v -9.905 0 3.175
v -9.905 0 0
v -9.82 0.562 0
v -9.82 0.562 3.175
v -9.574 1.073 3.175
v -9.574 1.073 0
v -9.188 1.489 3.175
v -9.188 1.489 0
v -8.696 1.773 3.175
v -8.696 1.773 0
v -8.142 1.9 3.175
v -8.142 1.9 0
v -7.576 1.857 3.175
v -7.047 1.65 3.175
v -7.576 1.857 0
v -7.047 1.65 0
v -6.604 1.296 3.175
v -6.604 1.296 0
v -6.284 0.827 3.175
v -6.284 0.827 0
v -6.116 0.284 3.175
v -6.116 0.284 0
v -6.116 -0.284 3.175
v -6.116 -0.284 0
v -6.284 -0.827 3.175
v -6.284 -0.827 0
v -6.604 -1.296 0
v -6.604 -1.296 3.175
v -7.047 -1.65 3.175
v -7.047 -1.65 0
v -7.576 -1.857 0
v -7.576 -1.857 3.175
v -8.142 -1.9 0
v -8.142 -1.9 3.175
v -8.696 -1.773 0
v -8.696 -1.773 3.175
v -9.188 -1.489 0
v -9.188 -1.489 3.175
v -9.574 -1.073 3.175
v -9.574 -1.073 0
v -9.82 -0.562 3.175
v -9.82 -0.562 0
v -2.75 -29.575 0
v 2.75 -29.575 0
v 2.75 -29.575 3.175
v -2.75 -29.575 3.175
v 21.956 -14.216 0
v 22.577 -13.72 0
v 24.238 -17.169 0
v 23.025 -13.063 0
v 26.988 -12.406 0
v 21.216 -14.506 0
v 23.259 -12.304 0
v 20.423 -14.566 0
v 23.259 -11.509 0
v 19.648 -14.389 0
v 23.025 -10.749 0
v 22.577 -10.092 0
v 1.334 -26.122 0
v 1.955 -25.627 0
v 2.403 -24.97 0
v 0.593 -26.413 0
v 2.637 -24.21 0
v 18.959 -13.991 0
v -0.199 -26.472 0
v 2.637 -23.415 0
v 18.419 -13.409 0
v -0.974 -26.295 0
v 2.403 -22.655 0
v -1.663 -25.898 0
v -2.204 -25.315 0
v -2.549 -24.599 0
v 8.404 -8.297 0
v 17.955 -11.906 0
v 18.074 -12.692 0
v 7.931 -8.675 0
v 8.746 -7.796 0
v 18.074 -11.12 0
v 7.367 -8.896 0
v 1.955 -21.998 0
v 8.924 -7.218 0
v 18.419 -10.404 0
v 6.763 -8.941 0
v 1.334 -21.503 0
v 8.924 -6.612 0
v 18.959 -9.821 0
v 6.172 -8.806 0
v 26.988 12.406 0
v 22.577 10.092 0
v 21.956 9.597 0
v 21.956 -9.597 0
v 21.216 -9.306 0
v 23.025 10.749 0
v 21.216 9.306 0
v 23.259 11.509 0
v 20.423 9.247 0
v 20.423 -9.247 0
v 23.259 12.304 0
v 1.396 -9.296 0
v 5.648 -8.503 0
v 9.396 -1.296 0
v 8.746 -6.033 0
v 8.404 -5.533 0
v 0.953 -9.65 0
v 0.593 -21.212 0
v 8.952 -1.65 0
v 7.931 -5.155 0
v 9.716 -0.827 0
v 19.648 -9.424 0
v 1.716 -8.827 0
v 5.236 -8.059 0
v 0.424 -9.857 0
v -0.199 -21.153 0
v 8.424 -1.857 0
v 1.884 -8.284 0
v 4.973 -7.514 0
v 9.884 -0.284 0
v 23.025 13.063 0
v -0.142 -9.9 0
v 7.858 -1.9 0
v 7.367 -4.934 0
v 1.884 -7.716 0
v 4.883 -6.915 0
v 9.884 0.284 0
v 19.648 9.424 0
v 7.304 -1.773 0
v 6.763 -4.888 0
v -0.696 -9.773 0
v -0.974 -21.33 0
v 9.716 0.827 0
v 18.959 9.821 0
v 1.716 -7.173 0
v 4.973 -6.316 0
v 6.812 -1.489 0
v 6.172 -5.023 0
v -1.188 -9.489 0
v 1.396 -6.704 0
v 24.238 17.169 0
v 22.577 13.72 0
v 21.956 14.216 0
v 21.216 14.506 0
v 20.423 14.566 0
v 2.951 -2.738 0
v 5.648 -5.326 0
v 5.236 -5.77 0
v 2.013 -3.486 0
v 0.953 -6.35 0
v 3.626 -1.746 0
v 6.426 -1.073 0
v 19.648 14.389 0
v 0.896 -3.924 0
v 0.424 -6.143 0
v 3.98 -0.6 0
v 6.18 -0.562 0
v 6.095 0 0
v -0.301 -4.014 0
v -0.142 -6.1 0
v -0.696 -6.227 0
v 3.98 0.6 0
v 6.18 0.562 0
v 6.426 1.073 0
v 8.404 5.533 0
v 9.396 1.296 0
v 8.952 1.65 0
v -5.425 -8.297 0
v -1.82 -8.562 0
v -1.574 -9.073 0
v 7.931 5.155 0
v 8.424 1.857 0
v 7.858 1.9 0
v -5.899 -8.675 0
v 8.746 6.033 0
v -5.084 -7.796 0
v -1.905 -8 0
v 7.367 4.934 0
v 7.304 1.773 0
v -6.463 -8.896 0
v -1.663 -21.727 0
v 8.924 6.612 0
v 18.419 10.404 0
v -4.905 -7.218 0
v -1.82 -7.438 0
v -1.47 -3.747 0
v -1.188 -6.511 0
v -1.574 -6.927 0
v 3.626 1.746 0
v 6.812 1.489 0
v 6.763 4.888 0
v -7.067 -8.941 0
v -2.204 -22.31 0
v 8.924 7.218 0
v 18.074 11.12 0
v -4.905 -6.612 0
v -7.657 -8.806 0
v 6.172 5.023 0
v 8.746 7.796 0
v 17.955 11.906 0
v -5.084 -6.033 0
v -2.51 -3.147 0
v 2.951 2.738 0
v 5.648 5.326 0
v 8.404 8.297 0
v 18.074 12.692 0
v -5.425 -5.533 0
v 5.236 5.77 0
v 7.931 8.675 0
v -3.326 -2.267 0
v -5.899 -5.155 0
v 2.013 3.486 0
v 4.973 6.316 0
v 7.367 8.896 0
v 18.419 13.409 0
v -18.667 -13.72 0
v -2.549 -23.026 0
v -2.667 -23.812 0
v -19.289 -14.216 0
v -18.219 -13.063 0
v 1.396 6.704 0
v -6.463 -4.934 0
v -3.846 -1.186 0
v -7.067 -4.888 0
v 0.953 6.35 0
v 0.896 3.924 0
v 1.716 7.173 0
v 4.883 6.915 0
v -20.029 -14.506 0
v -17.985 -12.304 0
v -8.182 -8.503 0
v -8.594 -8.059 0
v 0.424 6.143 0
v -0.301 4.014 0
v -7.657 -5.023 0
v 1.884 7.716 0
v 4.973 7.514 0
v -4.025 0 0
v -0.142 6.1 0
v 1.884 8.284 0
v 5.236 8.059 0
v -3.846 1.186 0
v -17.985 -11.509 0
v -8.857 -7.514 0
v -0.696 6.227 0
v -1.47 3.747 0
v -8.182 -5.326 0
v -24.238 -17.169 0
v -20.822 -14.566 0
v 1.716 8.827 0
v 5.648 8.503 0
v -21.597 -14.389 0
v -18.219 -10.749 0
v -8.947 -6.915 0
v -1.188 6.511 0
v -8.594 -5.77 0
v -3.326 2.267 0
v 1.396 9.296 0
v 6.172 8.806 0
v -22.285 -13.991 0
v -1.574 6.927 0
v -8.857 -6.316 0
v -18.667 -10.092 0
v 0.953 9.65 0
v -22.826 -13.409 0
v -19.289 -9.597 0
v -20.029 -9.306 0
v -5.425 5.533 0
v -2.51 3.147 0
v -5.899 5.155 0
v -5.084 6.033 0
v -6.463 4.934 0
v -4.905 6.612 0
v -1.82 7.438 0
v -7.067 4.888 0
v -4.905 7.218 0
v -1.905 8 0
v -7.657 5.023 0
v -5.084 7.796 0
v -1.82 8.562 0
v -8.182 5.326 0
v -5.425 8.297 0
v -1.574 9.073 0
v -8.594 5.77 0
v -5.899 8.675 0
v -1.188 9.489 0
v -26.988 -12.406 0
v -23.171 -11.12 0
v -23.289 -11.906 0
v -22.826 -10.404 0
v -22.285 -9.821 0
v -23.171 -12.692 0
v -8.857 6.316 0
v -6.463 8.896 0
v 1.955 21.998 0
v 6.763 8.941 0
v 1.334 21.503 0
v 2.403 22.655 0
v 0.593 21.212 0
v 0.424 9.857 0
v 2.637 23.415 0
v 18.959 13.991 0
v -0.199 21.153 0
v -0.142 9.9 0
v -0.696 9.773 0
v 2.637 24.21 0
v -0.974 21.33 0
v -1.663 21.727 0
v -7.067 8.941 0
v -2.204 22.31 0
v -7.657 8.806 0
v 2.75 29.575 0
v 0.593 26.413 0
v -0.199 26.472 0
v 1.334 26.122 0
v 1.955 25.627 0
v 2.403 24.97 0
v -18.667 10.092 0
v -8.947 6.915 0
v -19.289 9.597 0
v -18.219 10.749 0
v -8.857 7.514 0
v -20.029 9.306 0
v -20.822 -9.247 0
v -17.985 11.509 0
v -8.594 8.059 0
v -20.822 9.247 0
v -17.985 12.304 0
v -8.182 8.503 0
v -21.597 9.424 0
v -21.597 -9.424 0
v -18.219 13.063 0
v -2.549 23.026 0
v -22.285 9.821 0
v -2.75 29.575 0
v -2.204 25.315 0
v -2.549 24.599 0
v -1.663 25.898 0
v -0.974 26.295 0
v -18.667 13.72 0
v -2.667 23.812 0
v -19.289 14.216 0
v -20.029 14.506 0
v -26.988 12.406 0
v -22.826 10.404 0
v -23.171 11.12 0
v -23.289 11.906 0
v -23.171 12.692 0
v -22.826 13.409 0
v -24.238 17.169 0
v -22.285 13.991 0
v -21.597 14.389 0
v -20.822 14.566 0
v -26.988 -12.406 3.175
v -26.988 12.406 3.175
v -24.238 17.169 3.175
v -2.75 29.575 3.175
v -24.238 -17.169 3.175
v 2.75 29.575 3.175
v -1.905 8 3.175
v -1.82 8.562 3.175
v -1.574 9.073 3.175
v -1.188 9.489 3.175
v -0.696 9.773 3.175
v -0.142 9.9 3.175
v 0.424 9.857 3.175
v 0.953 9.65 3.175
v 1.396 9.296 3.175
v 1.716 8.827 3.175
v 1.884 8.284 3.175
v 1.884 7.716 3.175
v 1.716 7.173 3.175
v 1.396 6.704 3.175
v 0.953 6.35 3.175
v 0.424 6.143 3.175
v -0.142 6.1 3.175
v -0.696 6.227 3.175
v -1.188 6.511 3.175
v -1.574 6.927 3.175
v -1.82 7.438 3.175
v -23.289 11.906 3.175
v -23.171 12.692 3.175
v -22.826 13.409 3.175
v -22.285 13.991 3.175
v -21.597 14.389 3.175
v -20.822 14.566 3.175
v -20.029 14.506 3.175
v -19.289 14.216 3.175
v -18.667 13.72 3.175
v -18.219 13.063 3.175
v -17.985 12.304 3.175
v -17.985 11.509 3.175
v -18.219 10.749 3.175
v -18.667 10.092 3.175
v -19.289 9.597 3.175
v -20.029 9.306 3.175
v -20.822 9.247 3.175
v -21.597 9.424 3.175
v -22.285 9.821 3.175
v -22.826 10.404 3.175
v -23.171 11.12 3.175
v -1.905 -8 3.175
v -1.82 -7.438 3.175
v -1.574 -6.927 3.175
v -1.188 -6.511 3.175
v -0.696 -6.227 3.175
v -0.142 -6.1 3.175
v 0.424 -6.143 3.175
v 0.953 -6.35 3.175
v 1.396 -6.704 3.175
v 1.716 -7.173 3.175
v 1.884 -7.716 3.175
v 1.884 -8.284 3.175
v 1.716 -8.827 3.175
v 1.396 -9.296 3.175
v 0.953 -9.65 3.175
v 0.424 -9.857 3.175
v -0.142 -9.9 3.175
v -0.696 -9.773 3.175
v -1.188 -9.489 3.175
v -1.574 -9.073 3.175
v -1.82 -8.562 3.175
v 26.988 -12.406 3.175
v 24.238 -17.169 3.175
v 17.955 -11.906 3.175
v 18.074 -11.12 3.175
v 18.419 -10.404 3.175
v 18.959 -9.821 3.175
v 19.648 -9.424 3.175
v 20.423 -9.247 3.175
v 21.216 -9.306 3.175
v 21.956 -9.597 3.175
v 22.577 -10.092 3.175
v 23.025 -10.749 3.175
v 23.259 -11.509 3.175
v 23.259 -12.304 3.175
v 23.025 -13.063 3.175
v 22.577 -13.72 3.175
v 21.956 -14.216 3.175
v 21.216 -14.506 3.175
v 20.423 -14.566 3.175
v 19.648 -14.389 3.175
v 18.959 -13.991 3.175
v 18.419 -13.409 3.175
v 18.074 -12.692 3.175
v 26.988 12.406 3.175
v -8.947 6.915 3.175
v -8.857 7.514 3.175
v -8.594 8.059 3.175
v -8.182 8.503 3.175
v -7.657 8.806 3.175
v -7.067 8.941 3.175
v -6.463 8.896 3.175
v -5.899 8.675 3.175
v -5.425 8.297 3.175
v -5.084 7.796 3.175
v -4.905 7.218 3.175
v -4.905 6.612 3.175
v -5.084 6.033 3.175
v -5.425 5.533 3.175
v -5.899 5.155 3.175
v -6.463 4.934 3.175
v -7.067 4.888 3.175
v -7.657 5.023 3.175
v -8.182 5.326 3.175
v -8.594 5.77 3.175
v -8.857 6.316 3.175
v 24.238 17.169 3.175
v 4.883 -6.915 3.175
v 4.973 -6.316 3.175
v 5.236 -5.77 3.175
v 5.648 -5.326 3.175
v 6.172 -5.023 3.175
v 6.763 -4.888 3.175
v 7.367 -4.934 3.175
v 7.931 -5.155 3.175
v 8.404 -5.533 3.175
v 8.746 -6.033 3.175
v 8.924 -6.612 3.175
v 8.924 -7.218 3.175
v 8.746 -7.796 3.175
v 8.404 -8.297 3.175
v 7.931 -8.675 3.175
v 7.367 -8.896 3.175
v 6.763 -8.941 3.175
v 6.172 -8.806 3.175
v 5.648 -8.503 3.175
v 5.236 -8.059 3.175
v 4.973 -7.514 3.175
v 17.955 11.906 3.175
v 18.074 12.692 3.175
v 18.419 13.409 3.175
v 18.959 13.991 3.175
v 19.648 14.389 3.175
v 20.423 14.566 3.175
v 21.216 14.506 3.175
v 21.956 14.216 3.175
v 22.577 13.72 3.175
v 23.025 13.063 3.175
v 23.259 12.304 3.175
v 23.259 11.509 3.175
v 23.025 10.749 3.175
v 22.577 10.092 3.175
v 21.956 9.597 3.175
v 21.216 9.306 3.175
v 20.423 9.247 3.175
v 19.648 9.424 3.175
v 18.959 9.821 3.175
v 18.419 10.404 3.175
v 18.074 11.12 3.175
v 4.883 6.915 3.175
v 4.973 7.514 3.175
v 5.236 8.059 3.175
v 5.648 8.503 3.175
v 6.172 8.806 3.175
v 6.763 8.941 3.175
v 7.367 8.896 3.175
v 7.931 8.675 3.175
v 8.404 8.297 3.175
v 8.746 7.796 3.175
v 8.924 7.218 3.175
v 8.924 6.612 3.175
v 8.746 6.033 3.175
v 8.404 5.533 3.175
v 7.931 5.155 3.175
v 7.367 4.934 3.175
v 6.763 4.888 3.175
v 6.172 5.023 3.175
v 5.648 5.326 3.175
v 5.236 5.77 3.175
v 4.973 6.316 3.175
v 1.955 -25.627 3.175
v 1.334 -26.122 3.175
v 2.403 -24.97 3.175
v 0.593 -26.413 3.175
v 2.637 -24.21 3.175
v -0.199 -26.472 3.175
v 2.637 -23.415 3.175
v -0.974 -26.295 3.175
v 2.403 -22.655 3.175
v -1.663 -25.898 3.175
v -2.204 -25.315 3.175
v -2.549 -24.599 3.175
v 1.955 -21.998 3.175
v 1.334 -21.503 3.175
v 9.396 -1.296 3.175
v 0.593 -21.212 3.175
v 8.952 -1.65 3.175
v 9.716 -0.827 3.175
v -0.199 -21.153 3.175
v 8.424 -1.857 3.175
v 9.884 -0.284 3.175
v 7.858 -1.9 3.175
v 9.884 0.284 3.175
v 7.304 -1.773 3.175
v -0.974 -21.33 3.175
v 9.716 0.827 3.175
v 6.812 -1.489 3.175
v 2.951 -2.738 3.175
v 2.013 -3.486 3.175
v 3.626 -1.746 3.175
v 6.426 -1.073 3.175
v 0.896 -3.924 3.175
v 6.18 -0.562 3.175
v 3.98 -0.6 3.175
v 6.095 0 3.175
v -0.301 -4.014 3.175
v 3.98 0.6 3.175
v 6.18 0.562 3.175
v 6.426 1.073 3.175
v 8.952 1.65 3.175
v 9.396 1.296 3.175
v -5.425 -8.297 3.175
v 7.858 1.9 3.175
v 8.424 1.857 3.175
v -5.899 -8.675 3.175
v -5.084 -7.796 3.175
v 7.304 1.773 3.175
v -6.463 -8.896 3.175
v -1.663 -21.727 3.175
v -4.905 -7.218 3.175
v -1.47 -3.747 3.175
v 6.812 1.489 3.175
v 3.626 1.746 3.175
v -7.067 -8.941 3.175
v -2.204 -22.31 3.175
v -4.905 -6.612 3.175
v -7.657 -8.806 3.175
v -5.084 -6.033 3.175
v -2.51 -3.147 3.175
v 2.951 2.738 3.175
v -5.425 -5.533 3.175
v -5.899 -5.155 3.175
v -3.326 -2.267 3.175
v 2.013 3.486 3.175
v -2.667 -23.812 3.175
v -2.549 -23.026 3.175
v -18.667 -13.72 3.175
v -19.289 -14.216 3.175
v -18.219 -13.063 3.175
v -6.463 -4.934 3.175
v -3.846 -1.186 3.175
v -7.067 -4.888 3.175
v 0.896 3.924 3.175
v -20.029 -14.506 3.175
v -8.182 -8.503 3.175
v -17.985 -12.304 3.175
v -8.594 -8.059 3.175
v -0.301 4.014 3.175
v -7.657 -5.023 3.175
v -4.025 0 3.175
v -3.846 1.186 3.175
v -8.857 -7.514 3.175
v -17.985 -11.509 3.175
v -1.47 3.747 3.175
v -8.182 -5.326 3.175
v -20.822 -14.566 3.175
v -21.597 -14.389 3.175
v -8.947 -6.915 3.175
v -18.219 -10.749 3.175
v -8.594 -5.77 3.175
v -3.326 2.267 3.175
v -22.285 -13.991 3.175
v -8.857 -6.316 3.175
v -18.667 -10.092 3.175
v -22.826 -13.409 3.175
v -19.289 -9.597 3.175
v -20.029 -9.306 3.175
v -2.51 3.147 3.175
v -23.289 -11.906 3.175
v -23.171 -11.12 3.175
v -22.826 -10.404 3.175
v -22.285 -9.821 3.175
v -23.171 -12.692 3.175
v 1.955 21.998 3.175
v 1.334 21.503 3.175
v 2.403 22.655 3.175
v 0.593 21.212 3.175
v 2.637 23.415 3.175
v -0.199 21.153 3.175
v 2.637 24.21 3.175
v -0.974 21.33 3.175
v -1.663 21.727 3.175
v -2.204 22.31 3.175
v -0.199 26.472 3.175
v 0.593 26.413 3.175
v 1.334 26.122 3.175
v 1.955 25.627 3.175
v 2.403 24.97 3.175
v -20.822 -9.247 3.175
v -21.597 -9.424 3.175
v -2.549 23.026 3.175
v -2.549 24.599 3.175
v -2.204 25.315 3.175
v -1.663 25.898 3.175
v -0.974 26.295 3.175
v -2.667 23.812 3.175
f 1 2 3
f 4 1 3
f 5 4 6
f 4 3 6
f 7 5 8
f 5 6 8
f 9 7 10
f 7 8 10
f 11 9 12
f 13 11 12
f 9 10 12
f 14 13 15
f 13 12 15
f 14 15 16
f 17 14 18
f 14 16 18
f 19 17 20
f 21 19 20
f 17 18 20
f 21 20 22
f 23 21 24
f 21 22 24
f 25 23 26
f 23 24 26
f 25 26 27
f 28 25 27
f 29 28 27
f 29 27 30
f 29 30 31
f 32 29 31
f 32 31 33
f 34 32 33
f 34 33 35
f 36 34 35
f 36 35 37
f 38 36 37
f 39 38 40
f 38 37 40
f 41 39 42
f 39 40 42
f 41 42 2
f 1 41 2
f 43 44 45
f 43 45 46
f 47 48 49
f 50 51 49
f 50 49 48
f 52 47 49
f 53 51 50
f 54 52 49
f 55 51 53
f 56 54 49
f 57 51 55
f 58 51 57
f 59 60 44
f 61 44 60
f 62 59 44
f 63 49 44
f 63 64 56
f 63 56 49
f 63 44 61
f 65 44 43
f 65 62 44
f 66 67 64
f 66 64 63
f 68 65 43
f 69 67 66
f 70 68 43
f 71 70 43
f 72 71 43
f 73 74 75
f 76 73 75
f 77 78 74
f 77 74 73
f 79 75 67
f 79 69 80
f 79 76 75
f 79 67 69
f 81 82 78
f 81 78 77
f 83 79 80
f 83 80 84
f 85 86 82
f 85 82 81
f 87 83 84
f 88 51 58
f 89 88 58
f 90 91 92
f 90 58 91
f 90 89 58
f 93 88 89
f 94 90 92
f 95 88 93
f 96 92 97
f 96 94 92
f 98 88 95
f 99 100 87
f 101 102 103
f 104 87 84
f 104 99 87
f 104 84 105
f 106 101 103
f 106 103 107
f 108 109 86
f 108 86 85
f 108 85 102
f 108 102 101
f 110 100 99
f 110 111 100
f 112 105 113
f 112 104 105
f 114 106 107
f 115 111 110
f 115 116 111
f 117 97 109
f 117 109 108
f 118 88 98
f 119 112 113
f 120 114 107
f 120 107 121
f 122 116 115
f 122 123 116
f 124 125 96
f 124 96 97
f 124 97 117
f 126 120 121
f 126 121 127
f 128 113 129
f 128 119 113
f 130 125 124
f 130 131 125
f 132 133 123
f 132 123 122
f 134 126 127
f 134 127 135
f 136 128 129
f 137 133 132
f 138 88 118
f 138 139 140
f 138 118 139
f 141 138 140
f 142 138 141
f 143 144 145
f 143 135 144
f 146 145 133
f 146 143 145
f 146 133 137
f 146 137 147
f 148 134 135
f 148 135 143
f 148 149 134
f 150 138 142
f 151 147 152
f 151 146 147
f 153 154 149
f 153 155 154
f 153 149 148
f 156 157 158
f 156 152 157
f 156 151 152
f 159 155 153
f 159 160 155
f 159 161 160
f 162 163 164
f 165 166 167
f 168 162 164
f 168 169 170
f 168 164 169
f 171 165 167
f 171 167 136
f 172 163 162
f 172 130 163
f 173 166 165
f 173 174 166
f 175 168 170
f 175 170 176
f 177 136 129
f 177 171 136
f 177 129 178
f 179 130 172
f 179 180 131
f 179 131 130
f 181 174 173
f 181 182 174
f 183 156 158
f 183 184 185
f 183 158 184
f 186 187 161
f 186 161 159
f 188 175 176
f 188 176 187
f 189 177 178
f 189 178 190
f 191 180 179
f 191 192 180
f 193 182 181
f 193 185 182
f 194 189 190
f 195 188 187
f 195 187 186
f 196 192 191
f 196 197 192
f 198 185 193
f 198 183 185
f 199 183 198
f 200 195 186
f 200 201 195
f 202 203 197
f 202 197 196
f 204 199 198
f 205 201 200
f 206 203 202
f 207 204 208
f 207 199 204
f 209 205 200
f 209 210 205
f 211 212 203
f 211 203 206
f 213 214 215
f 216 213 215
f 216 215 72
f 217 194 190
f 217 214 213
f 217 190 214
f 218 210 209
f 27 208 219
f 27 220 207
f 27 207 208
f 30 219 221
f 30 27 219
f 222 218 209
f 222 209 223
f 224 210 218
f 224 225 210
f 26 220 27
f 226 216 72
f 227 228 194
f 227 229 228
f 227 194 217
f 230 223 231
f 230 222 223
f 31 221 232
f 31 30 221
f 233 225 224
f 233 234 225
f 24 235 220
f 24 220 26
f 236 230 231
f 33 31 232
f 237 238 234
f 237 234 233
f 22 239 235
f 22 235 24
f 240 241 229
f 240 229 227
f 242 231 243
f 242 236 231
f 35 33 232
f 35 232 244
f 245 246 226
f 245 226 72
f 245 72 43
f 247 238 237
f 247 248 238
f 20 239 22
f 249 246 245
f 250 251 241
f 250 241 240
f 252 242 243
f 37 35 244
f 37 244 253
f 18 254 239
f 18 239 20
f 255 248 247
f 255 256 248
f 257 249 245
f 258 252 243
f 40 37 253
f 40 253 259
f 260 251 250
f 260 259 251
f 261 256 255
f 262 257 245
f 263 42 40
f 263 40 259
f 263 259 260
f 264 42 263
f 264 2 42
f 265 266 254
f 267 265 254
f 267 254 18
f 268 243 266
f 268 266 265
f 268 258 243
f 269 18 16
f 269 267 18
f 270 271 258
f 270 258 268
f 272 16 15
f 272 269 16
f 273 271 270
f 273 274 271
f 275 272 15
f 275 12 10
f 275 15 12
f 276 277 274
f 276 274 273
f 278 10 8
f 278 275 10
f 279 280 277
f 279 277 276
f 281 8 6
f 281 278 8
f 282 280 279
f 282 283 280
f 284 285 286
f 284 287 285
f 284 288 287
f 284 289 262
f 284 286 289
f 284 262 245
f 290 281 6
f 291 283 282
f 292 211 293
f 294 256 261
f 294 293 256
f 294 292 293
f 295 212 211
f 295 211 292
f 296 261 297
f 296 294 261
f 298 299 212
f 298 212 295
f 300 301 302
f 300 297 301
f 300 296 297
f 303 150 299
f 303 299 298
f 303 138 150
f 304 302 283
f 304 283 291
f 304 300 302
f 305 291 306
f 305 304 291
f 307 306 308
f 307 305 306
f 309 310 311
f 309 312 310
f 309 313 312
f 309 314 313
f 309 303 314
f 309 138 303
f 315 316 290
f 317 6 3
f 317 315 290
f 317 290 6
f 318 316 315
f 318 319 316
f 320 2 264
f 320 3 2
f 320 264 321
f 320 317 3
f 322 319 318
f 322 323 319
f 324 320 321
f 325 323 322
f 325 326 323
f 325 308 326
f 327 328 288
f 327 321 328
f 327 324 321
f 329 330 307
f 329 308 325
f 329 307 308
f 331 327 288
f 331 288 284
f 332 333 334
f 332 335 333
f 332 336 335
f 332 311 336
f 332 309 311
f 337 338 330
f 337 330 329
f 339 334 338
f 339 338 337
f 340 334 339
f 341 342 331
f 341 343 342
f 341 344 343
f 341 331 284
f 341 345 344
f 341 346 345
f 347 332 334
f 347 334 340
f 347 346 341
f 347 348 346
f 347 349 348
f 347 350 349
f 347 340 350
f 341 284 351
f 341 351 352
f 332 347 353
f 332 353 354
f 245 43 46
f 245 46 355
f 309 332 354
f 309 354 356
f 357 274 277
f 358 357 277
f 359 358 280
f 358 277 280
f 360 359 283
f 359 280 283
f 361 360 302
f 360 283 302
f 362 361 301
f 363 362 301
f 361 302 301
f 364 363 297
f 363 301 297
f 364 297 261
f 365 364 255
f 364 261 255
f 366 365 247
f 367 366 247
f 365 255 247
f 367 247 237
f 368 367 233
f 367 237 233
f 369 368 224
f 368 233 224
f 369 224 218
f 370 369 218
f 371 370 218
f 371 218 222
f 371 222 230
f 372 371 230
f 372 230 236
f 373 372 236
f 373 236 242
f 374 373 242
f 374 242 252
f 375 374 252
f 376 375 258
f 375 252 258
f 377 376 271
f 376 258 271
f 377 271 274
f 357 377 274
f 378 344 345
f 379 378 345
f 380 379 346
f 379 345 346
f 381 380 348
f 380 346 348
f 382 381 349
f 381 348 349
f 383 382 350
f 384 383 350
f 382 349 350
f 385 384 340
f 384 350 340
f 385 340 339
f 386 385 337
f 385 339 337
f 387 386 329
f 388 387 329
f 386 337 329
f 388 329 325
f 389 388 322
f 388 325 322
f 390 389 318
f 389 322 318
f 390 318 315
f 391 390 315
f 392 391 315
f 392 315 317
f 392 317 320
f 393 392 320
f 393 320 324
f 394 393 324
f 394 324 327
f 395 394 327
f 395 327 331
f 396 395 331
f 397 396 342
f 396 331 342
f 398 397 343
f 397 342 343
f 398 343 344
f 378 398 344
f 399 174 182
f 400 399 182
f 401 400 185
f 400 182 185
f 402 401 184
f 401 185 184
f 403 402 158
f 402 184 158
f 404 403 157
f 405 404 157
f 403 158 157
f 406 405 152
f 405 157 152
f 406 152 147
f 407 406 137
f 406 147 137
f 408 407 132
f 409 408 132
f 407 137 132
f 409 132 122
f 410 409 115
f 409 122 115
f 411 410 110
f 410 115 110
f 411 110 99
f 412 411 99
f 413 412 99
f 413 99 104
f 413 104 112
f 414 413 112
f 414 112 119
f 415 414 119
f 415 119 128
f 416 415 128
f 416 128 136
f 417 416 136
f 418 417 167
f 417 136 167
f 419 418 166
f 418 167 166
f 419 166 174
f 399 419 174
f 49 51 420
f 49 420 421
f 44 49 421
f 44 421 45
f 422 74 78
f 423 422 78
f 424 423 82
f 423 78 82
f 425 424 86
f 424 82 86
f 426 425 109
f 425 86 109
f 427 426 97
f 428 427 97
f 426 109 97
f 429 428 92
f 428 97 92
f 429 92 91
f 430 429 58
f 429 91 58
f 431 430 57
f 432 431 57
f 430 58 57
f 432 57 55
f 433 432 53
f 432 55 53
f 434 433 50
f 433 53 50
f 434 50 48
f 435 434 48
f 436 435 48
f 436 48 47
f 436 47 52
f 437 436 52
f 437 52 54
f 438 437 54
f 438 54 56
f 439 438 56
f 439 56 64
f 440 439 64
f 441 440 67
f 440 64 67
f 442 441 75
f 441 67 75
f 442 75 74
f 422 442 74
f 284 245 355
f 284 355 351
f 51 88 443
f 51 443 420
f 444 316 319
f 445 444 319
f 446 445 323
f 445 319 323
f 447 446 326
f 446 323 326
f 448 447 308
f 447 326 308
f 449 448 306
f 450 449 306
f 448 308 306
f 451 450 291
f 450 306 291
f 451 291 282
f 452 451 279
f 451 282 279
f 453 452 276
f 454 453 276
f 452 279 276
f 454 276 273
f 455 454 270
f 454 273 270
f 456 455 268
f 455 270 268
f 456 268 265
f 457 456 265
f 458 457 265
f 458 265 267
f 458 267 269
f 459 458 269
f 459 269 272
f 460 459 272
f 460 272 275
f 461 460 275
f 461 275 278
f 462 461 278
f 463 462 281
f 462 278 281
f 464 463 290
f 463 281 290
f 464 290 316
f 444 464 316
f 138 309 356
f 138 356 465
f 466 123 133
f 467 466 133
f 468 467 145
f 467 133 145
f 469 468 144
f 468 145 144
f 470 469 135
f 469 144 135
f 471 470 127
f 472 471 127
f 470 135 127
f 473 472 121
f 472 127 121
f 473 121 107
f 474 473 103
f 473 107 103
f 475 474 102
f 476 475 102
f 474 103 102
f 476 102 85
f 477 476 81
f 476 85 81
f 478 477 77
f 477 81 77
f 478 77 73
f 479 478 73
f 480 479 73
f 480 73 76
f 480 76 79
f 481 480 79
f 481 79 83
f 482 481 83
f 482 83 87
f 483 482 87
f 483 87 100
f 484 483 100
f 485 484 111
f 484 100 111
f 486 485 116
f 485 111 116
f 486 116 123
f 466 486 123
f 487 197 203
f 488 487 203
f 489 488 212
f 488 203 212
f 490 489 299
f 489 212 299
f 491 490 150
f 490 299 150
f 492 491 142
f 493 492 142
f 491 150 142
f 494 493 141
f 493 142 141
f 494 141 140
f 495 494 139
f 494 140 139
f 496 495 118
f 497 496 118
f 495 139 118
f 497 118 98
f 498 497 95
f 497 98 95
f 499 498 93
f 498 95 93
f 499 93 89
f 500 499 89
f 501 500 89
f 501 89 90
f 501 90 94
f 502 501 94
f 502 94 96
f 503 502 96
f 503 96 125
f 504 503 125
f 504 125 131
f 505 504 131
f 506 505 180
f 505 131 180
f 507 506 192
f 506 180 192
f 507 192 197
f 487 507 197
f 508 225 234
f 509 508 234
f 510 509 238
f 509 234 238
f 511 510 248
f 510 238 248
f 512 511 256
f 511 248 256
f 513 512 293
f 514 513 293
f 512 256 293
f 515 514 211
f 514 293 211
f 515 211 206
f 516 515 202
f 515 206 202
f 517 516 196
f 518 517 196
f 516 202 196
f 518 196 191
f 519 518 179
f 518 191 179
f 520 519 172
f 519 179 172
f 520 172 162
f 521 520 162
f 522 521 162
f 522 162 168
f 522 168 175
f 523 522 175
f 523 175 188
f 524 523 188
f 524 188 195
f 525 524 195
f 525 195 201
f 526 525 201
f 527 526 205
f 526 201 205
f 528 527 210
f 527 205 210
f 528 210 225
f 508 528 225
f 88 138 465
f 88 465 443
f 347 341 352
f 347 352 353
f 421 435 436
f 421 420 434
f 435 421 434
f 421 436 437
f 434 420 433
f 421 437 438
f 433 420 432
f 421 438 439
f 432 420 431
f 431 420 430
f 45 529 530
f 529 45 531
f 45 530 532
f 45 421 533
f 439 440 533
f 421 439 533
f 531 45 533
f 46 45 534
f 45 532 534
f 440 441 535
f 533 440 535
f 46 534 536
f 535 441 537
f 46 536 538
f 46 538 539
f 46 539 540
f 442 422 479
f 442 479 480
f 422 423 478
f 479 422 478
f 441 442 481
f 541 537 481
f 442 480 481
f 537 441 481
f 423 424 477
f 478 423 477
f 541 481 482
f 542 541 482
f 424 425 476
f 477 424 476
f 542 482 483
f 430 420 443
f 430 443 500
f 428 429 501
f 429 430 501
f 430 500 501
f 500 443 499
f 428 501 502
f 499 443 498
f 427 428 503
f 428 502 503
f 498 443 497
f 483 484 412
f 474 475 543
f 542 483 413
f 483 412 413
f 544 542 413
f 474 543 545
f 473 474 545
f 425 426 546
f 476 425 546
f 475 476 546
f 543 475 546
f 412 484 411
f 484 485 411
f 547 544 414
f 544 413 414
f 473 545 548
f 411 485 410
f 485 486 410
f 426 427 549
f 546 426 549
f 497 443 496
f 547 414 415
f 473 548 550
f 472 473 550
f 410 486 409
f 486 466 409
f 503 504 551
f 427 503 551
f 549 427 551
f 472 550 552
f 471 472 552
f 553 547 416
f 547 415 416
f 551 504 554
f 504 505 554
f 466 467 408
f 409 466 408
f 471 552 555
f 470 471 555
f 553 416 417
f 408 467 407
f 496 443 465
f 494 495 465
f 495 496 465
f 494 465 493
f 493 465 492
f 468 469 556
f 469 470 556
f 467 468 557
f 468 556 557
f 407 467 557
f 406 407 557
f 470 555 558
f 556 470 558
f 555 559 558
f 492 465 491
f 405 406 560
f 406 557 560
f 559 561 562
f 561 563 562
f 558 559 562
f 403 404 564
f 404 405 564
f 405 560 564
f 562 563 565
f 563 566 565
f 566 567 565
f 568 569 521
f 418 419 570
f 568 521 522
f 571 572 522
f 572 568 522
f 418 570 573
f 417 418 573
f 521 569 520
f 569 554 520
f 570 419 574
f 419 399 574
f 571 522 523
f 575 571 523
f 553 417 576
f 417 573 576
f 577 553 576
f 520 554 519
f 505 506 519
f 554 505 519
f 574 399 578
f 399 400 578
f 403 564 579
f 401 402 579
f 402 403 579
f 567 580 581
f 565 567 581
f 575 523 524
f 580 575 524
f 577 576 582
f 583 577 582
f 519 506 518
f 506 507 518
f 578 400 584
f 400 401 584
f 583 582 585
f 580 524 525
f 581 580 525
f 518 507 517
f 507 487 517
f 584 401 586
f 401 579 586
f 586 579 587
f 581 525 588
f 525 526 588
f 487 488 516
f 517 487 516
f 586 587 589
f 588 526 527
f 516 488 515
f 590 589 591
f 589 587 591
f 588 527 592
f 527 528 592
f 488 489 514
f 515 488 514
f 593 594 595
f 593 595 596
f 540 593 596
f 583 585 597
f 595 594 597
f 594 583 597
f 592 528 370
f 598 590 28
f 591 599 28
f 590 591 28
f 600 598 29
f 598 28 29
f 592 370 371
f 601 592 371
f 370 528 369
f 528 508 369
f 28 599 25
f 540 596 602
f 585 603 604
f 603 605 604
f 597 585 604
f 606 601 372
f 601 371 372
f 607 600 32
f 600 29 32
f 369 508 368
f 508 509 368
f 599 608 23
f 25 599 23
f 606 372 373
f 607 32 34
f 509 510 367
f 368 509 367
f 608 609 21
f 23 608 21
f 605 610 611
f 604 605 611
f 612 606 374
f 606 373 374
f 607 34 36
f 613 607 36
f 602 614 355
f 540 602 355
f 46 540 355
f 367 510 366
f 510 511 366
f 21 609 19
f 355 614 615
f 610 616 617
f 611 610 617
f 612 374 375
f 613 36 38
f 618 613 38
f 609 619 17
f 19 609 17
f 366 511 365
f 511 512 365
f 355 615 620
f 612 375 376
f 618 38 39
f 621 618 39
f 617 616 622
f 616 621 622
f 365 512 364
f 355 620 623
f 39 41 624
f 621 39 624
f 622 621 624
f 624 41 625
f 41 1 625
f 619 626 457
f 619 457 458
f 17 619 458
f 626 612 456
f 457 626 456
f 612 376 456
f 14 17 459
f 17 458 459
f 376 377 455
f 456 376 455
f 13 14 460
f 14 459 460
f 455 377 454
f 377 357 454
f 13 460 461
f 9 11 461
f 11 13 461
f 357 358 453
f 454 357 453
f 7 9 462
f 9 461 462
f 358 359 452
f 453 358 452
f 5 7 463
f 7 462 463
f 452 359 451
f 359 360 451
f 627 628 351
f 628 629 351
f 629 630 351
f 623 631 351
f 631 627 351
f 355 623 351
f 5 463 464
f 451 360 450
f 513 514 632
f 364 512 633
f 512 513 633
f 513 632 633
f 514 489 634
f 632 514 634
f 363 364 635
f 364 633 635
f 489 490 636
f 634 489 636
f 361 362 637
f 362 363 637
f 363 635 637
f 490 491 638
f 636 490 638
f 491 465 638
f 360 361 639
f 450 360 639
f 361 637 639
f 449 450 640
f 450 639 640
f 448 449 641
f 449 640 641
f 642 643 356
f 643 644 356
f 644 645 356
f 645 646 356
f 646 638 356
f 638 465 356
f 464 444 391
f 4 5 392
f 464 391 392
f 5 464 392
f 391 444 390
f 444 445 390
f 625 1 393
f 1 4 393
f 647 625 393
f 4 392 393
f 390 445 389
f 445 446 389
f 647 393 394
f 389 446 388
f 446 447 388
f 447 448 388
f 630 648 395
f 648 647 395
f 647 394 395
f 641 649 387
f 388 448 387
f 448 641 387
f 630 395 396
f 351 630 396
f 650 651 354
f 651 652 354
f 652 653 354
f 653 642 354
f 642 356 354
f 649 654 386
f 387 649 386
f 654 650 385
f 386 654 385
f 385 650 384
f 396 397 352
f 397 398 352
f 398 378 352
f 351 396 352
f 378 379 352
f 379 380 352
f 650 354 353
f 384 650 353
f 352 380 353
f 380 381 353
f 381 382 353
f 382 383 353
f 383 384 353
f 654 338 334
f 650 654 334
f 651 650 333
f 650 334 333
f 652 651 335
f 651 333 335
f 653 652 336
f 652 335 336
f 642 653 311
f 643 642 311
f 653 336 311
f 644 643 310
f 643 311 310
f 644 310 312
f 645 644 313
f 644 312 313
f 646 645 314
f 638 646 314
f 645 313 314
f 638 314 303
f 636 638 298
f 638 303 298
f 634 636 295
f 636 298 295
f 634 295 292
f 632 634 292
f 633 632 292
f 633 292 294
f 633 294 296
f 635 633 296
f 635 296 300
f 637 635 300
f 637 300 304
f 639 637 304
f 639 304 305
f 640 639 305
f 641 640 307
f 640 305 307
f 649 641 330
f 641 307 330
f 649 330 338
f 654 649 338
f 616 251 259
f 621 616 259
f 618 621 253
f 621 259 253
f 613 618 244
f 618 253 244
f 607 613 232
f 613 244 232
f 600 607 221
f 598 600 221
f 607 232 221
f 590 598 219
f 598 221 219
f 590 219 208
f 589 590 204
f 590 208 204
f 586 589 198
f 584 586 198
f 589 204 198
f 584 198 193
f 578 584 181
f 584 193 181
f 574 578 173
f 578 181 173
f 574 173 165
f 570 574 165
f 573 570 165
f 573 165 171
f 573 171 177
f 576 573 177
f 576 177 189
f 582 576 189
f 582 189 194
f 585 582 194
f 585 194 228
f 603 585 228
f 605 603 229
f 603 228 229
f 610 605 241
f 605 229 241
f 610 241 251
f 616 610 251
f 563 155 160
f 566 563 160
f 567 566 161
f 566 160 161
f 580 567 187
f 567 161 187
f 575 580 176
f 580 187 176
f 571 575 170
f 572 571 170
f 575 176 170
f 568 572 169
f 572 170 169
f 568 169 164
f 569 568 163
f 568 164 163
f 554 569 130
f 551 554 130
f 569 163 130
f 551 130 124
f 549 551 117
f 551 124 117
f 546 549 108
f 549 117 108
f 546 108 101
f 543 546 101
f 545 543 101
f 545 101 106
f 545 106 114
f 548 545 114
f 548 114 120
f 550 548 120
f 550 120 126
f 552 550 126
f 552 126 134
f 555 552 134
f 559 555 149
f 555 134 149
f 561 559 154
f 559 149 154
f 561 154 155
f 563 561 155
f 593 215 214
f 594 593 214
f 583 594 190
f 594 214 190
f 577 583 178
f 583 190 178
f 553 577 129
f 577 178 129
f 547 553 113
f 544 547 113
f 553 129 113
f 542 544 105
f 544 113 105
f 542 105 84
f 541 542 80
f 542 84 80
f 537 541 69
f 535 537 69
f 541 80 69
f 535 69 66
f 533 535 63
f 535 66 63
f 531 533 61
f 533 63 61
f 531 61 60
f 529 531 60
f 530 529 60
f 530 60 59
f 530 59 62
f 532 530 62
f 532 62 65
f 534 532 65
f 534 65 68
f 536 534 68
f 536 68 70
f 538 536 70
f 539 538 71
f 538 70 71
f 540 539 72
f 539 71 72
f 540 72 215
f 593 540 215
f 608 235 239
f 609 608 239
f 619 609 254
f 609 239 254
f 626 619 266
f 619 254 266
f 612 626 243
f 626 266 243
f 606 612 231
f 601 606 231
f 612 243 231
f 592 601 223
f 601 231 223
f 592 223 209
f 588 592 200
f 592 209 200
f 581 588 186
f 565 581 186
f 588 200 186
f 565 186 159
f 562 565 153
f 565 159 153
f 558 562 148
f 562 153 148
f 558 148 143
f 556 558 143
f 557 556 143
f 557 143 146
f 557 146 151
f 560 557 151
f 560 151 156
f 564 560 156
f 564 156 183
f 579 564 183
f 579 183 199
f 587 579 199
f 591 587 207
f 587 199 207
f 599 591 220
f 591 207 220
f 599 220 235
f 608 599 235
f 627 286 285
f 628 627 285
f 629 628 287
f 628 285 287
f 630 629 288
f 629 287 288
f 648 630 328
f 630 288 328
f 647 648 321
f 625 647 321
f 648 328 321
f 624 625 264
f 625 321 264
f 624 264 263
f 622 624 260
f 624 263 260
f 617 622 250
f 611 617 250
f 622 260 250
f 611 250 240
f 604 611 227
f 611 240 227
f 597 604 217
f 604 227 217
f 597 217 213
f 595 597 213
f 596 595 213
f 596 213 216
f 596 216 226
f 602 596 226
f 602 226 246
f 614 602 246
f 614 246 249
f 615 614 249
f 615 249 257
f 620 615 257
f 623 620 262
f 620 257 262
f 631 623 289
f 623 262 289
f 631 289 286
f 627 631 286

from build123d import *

# Parameters (mm, degrees)
SKETCH1_R           = 2.667
SKETCH1_R_2         = 1.905
SKETCH1_R_3         = 4.025
SKETCH1_R_4         = 2.032
BOSS_EXTRUDE1_DEPTH = 3.175


with BuildPart() as part:
    # Sketch1 → Boss-Extrude1 (new body)
    with BuildSketch(Plane(origin=(0, 0, 0), x_dir=(-1, 0, 0), z_dir=(0, 0, -1))):
        Polygon((2.749630657, 29.57498078), (-2.749630657, 29.57498078), (-24.237869343, 17.16874039), (-26.9875, 12.40624039), (-26.9875, -12.40624039), (-24.237869343, -17.16874039), (-2.749630657, -29.57498078), (2.749630657, -29.57498078), (24.237869343, -17.16874039), (26.9875, -12.40624039), (26.9875, 12.40624039), (24.237869343, 17.16874039), align=None)
        with Locations((20.622229928, 11.90625)):
            Circle(SKETCH1_R, mode=Mode.SUBTRACT)
        with Locations((0, -23.8125)):
            Circle(SKETCH1_R, mode=Mode.SUBTRACT)
        with Locations((-20.622229928, 11.90625)):
            Circle(SKETCH1_R, mode=Mode.SUBTRACT)
        with Locations((0, -8)):
            Circle(SKETCH1_R_2, mode=Mode.SUBTRACT)
        with Locations((0, 8)):
            Circle(SKETCH1_R_2, mode=Mode.SUBTRACT)
        with Locations((0, 23.8125)):
            Circle(SKETCH1_R, mode=Mode.SUBTRACT)
        Circle(SKETCH1_R_3, mode=Mode.SUBTRACT)
        with Locations((-8, 0)):
            Circle(SKETCH1_R_2, mode=Mode.SUBTRACT)
        with Locations((8, 0)):
            Circle(SKETCH1_R_2, mode=Mode.SUBTRACT)
        with Locations((-20.622229928, -11.90625)):
            Circle(SKETCH1_R, mode=Mode.SUBTRACT)
        with Locations((20.622229928, -11.90625)):
            Circle(SKETCH1_R, mode=Mode.SUBTRACT)
        with Locations((-6.914797213, 6.914797213)):
            Circle(SKETCH1_R_4, mode=Mode.SUBTRACT)
        with Locations((-6.914797213, -6.914797213)):
            Circle(SKETCH1_R_4, mode=Mode.SUBTRACT)
        with Locations((6.914797213, -6.914797213)):
            Circle(SKETCH1_R_4, mode=Mode.SUBTRACT)
        with Locations((6.914797213, 6.914797213)):
            Circle(SKETCH1_R_4, mode=Mode.SUBTRACT)
    extrude(amount=-BOSS_EXTRUDE1_DEPTH)


solid = part.part
